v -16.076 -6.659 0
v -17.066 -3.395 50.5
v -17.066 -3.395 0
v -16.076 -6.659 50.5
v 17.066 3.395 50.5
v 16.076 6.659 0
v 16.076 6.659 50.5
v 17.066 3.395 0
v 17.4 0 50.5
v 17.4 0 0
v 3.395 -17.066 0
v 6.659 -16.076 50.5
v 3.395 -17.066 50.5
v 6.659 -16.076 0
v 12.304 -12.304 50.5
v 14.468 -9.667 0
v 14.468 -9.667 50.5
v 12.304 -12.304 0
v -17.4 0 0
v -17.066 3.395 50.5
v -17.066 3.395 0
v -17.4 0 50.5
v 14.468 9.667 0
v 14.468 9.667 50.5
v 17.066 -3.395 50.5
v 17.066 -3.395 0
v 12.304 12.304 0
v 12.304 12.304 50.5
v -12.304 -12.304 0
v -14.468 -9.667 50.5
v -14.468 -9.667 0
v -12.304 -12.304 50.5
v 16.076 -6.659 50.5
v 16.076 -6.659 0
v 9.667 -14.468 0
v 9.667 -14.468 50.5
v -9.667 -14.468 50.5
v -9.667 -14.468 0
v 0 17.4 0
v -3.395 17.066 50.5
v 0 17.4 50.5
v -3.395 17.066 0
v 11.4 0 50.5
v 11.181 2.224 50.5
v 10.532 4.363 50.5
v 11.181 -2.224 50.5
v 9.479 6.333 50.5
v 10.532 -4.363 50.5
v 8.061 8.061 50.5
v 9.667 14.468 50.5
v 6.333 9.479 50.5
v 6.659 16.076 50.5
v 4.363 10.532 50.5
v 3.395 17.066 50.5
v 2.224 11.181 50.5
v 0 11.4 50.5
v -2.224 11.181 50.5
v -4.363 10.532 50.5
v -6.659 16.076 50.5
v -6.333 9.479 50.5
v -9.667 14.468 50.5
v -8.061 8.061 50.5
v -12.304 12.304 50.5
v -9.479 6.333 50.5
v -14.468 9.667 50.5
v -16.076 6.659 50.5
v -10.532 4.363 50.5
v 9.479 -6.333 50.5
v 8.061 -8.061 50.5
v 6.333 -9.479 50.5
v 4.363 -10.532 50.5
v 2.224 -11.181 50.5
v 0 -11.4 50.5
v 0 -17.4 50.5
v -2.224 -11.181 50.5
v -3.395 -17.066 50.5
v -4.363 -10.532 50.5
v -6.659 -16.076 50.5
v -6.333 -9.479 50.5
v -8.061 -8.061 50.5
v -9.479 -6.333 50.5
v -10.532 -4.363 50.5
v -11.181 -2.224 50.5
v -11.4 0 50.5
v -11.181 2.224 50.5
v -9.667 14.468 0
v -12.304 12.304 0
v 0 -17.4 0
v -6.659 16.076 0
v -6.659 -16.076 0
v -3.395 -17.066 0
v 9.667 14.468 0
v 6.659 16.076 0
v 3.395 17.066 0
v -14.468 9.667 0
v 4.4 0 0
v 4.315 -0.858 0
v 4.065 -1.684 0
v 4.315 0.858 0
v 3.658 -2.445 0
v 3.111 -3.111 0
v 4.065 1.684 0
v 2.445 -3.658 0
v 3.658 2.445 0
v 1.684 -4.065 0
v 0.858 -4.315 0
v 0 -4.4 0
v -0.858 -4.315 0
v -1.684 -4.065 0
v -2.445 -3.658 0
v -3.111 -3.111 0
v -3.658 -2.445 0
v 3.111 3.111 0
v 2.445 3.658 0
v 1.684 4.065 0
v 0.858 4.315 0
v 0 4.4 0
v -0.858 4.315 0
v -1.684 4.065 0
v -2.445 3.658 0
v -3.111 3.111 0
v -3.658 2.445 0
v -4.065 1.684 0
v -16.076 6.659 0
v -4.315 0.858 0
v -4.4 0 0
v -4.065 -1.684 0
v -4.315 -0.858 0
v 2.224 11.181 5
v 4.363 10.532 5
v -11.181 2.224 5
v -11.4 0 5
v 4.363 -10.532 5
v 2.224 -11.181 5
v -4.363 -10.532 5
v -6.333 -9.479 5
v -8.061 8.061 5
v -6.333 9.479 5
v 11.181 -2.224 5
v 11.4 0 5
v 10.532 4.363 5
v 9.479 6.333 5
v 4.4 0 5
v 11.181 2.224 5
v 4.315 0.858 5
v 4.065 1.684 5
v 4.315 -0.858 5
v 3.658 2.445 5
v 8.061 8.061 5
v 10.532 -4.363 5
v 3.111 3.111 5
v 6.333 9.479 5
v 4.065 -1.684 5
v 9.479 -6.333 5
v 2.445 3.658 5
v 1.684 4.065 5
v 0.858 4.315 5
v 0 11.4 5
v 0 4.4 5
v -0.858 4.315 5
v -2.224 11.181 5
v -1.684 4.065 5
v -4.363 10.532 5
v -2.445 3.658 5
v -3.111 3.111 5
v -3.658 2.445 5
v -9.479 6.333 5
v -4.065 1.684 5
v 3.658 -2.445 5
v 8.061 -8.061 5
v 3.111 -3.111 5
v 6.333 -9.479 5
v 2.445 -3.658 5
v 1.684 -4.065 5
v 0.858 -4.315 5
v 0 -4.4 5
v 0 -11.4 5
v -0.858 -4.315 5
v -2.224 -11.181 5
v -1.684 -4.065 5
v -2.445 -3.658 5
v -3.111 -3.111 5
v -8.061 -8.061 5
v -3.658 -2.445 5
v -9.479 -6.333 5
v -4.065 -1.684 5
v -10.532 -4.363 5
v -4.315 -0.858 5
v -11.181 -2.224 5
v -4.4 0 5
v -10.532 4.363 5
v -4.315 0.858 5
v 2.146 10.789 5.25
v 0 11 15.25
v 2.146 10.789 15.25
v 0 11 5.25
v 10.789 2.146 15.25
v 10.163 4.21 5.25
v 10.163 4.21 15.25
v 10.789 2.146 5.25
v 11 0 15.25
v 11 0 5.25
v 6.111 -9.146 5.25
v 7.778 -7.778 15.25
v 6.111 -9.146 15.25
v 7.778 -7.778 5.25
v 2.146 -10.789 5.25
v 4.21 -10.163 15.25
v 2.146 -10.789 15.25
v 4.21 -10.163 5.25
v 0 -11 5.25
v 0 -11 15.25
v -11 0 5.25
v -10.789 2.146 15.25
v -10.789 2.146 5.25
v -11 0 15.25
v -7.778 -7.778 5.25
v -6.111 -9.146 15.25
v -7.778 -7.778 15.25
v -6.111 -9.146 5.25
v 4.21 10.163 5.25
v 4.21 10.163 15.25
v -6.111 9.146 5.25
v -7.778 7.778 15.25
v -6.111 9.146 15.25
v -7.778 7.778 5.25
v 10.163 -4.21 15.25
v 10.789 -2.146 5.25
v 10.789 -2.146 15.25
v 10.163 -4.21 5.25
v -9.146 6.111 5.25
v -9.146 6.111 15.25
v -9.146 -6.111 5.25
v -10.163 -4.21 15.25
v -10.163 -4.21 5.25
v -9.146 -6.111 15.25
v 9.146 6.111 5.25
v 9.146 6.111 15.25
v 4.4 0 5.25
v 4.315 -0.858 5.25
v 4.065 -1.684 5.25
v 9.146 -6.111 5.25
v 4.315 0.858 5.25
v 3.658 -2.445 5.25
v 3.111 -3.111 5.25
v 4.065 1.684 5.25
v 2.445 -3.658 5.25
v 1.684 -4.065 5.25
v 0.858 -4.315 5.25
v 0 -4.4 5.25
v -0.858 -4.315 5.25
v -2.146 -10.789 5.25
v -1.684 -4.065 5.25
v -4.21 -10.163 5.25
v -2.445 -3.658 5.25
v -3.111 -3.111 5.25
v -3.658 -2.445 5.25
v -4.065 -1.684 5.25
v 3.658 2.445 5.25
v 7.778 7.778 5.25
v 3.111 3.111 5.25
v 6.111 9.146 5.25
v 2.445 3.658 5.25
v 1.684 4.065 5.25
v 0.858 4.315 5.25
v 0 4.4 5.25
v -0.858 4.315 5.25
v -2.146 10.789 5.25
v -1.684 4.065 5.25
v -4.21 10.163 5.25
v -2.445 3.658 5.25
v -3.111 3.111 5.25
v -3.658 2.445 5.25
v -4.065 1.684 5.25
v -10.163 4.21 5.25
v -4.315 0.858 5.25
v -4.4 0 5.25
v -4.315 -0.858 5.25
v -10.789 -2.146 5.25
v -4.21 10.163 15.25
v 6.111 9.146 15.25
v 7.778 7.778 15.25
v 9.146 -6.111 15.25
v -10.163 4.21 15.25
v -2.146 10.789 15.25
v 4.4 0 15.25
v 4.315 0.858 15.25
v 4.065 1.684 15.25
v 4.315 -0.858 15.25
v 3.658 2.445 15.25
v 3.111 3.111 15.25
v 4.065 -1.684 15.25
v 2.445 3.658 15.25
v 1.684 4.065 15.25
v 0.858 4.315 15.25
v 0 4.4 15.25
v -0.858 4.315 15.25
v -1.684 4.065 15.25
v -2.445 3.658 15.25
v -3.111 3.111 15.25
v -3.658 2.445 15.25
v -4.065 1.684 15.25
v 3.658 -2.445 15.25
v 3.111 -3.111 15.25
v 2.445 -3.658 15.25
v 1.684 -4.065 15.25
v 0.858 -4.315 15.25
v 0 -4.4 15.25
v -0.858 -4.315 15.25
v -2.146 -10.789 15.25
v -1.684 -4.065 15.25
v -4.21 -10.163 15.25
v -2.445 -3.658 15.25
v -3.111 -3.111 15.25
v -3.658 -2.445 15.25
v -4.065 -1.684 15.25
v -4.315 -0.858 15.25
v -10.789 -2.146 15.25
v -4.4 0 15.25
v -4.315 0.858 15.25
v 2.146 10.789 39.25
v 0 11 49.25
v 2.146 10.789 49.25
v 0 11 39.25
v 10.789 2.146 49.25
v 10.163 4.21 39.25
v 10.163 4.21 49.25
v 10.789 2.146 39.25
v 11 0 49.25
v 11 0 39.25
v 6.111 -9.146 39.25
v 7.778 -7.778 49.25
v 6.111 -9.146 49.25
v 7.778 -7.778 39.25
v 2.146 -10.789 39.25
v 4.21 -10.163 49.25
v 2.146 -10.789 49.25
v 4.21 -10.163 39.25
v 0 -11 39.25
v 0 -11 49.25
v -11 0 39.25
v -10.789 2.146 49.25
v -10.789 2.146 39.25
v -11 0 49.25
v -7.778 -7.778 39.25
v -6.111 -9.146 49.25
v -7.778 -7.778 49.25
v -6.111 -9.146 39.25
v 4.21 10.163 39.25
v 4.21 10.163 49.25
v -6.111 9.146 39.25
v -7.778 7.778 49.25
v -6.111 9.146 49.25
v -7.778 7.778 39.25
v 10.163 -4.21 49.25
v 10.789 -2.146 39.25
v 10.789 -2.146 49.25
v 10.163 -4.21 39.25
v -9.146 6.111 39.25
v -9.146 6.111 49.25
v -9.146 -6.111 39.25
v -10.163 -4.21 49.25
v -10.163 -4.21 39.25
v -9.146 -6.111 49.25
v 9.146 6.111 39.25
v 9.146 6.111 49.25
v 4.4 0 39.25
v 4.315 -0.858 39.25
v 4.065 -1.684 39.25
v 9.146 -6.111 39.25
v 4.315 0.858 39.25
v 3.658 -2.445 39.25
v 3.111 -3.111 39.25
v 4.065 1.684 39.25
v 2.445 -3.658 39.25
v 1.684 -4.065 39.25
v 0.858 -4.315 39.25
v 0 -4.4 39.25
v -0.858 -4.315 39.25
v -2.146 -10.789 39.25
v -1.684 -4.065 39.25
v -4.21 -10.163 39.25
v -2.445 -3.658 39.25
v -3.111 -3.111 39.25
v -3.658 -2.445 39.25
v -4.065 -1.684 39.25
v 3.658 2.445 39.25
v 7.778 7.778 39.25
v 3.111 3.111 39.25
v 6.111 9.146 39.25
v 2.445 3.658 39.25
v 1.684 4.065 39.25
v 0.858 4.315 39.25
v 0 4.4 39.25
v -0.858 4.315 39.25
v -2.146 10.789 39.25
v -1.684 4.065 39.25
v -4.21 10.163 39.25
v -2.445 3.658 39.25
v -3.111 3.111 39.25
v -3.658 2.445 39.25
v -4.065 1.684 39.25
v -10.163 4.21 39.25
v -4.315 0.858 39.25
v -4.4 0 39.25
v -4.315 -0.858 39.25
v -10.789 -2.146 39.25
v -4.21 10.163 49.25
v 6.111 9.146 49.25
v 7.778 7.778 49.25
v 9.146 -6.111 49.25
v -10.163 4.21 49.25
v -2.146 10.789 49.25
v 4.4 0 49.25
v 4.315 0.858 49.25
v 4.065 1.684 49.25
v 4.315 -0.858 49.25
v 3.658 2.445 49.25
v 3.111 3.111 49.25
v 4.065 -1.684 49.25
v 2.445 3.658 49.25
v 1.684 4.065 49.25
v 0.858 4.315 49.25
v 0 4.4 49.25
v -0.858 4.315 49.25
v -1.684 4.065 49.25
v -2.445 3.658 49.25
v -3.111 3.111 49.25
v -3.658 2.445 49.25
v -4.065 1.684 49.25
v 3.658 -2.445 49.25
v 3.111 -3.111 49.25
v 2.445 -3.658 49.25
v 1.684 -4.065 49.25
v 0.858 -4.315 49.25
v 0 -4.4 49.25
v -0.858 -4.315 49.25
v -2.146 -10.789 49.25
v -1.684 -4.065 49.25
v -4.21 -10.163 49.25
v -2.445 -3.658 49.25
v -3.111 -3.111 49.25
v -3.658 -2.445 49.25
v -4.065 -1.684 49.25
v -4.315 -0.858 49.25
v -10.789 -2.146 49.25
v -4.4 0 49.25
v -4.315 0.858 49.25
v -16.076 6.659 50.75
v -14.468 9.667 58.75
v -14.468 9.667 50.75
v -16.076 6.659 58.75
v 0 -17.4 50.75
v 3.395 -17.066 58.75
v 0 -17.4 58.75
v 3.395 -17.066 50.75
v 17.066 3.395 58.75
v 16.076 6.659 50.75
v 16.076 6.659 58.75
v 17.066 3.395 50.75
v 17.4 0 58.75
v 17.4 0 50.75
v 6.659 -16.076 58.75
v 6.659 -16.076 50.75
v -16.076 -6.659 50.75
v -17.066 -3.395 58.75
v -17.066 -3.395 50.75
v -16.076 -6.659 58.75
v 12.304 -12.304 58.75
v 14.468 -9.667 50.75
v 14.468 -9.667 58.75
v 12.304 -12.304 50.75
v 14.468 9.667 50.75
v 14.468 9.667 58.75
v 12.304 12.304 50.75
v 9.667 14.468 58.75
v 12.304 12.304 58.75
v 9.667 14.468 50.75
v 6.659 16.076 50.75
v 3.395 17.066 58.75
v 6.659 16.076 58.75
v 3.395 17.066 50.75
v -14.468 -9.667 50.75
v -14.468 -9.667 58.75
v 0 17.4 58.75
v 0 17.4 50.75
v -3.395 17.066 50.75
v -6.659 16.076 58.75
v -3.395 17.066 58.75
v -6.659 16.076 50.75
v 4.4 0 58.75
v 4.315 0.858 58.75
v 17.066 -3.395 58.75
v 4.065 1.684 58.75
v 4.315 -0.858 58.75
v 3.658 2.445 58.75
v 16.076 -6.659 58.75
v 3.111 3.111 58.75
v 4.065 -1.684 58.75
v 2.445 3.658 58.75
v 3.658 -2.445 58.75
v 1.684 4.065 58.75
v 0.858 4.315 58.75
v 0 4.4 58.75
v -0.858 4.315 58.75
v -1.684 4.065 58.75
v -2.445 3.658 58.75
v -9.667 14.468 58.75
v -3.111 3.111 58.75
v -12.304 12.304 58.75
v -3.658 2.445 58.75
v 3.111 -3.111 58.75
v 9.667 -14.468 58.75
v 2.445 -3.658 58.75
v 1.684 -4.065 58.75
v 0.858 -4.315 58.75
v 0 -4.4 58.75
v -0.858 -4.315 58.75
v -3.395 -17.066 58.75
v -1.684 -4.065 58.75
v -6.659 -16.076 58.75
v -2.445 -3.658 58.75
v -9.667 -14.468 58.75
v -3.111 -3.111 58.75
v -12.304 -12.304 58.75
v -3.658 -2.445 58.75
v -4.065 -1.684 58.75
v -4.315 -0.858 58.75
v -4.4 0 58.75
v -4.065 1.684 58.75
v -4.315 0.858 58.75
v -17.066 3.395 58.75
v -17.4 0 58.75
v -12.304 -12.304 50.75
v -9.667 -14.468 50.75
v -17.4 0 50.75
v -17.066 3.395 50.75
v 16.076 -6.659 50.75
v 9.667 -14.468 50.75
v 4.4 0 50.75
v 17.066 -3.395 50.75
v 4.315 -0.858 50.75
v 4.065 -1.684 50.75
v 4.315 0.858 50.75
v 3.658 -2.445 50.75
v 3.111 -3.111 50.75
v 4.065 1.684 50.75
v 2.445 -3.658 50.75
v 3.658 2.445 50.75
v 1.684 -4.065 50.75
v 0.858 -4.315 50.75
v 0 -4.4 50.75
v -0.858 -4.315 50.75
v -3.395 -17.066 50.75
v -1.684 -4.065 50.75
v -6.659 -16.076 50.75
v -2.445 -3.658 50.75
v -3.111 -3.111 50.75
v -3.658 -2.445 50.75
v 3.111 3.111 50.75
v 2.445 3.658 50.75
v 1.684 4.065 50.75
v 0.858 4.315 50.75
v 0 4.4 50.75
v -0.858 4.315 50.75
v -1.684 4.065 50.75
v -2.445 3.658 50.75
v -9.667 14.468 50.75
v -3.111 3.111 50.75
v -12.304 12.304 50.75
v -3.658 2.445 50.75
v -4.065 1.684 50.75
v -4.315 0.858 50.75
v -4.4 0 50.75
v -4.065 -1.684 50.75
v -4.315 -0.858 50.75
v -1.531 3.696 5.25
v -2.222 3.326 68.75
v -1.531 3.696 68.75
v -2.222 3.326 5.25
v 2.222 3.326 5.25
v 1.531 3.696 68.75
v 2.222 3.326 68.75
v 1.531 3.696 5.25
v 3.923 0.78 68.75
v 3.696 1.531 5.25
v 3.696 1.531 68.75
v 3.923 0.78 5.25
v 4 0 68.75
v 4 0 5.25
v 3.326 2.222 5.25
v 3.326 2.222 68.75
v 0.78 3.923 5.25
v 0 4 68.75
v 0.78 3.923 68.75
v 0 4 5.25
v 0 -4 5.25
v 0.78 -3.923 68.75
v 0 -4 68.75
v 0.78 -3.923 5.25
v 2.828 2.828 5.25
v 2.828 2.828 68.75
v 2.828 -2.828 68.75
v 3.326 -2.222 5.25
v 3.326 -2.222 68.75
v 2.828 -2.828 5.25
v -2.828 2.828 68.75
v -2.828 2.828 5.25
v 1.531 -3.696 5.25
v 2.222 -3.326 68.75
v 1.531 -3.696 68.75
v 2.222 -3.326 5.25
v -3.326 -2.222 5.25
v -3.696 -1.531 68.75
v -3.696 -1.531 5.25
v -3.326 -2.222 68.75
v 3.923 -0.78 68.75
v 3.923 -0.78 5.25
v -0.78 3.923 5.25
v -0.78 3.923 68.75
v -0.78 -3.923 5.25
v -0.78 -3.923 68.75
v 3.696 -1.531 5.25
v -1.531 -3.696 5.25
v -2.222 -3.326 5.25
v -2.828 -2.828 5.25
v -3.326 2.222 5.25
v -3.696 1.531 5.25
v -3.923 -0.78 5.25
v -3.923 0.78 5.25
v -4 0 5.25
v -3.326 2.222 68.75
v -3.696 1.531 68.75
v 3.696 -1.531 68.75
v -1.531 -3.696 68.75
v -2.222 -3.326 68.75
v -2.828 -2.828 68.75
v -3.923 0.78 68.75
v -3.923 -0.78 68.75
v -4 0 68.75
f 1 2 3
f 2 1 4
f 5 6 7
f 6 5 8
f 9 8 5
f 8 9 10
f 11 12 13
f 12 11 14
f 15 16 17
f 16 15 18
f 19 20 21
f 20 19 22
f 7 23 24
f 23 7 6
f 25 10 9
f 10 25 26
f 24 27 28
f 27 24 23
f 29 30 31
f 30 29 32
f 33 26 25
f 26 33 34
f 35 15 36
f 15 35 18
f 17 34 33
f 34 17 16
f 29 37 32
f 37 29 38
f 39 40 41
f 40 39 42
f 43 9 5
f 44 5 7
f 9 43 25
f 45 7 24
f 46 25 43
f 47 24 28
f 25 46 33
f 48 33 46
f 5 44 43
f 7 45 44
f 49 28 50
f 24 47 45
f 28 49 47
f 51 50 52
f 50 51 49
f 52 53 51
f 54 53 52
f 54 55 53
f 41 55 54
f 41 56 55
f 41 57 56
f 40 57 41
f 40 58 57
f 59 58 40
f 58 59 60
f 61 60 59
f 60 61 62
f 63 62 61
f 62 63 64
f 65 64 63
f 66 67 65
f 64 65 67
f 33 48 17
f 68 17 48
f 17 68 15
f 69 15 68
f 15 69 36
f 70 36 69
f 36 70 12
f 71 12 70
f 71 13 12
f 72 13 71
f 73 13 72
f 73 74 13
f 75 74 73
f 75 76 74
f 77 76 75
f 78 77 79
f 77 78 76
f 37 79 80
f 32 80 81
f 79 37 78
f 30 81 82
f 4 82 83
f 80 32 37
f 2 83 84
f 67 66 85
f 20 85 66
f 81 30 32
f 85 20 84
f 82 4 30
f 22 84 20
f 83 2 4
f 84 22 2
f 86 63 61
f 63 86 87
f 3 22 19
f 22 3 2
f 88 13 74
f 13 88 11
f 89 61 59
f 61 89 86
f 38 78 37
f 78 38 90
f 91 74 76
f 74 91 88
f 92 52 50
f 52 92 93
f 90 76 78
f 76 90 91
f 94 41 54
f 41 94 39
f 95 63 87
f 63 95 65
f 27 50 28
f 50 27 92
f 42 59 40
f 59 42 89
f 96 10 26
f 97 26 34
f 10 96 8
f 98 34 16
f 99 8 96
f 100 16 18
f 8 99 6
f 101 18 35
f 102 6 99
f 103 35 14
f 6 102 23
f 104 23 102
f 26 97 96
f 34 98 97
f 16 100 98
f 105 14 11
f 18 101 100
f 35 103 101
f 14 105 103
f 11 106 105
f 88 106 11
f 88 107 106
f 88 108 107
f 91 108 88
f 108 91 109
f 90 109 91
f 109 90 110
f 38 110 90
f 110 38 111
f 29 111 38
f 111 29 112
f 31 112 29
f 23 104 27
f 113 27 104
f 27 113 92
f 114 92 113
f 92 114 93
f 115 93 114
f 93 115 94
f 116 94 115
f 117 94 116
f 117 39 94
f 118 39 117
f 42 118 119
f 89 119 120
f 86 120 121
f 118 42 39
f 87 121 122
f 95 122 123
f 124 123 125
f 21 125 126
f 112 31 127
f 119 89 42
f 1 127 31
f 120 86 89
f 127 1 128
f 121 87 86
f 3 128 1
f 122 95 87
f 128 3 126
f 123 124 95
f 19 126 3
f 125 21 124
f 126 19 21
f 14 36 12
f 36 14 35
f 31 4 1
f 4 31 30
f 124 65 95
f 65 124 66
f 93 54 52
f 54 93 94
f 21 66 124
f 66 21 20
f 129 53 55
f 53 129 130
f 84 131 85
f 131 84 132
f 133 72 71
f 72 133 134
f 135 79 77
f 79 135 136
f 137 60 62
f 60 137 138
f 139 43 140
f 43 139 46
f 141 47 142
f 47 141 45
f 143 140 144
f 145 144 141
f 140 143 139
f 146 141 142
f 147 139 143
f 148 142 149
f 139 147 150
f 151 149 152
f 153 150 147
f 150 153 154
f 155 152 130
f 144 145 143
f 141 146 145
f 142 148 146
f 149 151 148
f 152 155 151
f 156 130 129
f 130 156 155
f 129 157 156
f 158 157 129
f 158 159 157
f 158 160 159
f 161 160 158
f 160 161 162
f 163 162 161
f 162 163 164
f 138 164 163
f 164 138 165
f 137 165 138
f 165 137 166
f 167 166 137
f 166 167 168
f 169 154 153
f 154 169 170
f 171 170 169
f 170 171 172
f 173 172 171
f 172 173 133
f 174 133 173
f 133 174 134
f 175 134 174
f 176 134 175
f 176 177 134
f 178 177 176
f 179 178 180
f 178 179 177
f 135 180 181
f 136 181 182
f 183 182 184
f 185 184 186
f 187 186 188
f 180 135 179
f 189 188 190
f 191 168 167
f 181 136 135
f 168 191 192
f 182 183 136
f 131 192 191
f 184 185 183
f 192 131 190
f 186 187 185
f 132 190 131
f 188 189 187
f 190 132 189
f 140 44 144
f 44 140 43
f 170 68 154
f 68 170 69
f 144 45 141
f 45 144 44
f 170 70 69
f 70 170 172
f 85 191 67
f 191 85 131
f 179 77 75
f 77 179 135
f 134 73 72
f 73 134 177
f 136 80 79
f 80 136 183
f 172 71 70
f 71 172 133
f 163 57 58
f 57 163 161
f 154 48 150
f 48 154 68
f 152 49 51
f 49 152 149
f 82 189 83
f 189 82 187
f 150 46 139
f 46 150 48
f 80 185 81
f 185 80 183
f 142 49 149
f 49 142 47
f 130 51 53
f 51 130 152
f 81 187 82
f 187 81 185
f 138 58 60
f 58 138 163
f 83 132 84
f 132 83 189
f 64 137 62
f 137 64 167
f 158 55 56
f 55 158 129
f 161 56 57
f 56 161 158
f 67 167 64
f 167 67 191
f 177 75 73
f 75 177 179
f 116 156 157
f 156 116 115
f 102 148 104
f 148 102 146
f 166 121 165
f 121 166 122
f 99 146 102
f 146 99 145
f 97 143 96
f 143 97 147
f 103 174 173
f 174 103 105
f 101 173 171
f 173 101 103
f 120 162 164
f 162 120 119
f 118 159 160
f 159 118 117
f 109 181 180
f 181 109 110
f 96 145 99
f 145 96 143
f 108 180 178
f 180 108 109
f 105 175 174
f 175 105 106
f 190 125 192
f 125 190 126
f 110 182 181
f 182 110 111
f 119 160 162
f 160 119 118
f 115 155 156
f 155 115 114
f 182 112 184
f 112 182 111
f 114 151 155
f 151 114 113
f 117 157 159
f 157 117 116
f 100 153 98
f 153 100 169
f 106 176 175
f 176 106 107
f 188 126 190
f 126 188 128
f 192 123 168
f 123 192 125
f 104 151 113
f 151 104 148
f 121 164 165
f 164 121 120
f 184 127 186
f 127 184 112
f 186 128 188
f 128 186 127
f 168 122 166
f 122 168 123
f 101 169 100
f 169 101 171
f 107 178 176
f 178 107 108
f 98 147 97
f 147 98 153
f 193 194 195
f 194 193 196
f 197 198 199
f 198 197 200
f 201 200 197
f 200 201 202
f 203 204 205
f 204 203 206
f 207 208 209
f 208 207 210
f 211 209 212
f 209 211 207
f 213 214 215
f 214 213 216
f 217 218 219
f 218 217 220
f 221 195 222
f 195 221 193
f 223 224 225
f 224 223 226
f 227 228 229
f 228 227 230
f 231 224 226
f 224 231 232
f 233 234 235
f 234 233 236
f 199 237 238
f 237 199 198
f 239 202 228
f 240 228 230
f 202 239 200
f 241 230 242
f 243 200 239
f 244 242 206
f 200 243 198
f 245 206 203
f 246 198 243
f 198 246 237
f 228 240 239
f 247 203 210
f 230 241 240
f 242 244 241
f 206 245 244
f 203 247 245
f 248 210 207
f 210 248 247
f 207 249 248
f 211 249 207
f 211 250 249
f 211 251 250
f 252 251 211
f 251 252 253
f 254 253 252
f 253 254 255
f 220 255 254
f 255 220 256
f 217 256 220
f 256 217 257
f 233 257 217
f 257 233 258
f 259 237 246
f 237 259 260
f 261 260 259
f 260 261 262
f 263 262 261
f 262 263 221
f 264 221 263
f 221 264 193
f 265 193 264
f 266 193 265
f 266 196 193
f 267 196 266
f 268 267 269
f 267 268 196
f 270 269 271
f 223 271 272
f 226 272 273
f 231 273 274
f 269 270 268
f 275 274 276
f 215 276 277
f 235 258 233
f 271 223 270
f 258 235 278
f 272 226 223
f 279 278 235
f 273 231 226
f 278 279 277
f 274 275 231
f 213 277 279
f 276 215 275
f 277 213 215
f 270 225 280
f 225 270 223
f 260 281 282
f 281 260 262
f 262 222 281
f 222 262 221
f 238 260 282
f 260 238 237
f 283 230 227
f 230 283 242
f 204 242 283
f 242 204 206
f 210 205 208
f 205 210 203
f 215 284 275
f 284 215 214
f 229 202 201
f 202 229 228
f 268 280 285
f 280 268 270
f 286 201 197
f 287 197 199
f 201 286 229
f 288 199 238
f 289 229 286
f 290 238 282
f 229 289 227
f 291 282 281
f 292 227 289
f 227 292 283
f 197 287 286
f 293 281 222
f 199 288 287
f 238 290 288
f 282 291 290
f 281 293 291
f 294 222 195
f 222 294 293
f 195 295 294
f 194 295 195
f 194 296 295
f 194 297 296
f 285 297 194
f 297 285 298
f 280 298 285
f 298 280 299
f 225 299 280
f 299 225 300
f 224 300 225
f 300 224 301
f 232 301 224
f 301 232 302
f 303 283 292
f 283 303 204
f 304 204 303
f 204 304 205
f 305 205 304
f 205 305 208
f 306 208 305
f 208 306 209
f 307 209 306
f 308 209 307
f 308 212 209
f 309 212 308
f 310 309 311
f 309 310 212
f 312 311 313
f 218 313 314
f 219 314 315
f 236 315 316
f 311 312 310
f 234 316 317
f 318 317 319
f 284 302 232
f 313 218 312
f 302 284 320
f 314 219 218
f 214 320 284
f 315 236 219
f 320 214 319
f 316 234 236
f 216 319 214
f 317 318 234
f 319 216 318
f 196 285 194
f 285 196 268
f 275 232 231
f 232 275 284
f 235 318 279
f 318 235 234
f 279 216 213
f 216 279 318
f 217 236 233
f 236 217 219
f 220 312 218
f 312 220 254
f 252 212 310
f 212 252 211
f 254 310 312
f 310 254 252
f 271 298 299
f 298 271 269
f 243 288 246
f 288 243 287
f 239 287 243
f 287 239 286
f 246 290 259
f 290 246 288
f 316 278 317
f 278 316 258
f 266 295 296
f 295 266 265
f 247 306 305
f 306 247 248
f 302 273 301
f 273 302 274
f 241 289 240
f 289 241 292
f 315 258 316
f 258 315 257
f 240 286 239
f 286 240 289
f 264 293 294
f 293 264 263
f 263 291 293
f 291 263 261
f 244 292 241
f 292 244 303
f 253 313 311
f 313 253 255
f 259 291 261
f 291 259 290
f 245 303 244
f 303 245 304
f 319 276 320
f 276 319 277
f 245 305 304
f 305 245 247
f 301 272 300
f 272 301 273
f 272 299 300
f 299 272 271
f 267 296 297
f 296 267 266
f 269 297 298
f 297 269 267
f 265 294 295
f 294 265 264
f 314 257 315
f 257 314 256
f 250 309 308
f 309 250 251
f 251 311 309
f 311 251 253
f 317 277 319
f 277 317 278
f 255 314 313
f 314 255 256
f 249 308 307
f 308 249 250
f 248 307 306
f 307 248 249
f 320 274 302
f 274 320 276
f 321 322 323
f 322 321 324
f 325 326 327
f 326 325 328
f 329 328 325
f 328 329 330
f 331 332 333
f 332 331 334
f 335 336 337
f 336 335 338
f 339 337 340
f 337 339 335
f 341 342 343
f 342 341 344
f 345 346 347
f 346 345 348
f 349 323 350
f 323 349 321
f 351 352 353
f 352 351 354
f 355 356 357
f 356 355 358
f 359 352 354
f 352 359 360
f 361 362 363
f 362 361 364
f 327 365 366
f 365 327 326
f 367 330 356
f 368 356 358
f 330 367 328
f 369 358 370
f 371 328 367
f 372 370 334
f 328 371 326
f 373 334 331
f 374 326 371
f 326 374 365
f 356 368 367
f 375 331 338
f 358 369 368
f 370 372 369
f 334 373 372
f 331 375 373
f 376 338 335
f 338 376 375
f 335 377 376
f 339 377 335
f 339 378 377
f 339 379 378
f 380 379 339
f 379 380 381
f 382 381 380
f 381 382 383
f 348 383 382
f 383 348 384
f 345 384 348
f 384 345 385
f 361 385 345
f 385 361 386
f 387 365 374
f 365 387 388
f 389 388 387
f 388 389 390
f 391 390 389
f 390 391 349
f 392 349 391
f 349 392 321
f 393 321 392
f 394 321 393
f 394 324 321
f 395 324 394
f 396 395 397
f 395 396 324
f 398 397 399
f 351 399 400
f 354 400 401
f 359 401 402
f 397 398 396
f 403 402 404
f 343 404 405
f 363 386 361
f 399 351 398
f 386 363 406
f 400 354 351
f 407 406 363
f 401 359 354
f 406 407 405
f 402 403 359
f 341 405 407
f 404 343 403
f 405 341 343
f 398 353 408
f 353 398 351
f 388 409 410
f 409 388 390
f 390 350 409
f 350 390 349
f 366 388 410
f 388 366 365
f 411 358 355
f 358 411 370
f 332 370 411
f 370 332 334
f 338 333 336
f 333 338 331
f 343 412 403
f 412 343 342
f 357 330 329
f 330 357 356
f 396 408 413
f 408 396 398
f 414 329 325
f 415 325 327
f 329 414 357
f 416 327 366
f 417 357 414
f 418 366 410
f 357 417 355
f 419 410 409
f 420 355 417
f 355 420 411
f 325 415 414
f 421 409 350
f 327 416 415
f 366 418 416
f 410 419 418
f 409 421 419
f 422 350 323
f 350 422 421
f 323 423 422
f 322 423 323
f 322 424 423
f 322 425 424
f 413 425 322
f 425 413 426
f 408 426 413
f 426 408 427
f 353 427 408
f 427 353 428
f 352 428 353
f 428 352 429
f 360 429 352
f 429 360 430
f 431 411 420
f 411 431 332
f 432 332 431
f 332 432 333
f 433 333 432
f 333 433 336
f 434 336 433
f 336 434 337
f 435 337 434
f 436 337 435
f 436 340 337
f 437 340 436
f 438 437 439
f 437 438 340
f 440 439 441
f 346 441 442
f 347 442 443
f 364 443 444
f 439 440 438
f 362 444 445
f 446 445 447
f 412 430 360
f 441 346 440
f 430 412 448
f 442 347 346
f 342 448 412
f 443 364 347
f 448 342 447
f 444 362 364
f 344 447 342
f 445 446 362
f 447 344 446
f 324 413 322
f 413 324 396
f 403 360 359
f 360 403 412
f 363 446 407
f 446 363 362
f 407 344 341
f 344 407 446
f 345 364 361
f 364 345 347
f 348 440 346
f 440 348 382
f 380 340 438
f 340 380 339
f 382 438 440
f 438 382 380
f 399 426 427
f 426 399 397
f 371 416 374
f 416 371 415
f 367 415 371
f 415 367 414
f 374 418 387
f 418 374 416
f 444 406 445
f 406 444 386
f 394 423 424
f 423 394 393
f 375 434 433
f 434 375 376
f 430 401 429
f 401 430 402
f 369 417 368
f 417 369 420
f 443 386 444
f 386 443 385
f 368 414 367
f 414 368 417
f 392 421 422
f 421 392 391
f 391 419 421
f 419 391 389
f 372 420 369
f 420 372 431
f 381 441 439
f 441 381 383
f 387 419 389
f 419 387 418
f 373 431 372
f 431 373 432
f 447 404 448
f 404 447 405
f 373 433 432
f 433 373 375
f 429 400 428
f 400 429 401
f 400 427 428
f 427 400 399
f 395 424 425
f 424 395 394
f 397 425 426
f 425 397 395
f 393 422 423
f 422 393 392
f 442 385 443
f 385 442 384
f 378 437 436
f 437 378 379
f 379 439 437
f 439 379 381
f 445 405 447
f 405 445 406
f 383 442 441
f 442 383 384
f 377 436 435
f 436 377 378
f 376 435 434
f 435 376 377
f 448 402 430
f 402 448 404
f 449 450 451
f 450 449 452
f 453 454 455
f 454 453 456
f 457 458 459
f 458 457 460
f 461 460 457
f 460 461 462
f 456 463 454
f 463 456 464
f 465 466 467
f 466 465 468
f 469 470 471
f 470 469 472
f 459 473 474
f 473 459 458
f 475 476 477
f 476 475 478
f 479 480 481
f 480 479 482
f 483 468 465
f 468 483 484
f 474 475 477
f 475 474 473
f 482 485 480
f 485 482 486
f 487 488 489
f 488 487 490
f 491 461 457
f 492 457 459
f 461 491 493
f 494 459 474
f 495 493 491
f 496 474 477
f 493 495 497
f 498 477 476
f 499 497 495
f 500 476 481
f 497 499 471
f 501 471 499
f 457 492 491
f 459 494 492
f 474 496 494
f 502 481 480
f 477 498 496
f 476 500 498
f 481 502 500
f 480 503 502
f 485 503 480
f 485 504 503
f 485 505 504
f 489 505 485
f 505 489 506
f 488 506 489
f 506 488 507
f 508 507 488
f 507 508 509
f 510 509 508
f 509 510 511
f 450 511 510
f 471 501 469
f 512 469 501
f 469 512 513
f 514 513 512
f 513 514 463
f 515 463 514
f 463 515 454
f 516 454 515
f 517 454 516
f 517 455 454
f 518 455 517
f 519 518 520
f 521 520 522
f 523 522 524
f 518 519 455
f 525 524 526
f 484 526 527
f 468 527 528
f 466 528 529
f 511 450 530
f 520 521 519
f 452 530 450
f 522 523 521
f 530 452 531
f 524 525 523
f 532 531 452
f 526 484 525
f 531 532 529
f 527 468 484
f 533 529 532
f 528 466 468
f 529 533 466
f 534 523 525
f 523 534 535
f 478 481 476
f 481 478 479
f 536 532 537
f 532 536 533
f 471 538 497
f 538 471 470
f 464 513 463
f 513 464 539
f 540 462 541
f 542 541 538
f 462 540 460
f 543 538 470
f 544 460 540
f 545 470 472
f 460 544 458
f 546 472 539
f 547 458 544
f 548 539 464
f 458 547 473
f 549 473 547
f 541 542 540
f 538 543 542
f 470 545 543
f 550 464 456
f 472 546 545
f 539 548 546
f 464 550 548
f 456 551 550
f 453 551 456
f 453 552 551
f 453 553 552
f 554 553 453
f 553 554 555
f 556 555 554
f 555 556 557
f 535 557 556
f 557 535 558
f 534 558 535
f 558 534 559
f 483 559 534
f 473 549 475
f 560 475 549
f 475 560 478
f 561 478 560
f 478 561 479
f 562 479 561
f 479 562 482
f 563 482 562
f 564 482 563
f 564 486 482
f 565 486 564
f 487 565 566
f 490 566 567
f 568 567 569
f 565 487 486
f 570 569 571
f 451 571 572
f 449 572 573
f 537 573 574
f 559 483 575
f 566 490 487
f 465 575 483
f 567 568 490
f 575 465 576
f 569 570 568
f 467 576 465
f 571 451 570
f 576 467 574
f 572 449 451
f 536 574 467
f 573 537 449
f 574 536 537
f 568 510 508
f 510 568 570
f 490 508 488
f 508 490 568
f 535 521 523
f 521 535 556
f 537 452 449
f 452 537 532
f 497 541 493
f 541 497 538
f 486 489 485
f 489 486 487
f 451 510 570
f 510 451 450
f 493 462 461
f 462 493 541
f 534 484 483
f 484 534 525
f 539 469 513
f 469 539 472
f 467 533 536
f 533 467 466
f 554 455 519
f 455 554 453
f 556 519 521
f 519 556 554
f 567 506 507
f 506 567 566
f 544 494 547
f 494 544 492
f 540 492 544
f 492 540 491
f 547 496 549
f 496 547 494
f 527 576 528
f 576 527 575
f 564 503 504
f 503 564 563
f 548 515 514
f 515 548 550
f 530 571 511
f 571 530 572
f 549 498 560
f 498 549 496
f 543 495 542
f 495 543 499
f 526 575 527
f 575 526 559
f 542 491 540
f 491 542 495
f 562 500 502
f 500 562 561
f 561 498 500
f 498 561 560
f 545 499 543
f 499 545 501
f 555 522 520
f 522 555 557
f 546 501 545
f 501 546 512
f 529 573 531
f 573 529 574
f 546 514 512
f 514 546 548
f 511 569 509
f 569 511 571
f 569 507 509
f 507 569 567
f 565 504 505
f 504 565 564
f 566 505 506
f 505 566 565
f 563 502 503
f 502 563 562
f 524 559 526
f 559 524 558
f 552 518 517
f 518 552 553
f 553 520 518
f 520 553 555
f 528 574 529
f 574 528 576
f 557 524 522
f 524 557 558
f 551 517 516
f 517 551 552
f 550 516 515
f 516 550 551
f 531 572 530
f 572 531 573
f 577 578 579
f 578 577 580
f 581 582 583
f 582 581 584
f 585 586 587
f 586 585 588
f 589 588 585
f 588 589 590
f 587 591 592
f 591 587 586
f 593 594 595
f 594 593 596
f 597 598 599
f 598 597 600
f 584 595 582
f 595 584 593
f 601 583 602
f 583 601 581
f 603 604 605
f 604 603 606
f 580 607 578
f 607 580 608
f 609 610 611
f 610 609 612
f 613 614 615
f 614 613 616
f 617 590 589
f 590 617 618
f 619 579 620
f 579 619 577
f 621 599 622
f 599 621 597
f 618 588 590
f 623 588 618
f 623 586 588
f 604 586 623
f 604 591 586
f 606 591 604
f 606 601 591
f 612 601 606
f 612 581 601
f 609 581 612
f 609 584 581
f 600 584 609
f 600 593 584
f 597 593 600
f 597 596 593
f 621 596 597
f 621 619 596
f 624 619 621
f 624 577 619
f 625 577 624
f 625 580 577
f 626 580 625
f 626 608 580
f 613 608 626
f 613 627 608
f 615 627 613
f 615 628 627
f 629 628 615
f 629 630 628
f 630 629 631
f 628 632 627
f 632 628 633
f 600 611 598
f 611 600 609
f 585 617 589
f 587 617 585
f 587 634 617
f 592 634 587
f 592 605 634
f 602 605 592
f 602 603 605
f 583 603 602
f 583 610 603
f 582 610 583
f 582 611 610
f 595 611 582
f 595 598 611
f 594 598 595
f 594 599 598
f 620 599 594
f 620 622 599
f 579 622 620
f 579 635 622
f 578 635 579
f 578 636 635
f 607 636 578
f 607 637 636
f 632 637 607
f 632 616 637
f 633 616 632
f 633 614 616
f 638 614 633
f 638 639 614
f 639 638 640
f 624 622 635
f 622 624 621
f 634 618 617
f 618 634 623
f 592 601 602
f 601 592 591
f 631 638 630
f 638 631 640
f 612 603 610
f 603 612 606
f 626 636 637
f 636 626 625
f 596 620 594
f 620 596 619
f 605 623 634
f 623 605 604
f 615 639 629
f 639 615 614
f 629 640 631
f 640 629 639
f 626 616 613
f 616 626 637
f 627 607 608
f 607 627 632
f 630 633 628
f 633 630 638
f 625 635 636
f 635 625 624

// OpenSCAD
$fn = 32;

// ------------------------------------------------------------------------
// Shaft station: cup d34.8 x 50.5 mm, shaft d8
// Every part is its own module, assembly() places every instance.
// ------------------------------------------------------------------------

// --- part 1 ---
module housing_cup() {
  difference() {
    cylinder(h = 50.5, d = 34.8);
    translate([0, 0, 5]) cylinder(h = 46.5, d = 22.8);
    translate([0, 0, -1]) cylinder(h = 7, d = 8.8);
  }
}

// --- part 2 ---
module bearing_lower() {
  difference() {
      translate([0, 0, 0]) cylinder(h = 10, d = 22);
      translate([0, 0, -1]) cylinder(h = 12, d = 8.8);
    }
}

// --- part 3 ---
module bearing_upper() {
  difference() {
      translate([0, 0, 0]) cylinder(h = 10, d = 22);
      translate([0, 0, -1]) cylinder(h = 12, d = 8.8);
    }
}

// --- part 4 ---
module station_shaft() {
  translate([0, 0, -31.75]) cylinder(h = 63.5, d = 8);
}

// --- part 5 ---
module station_cover() {
  difference() {
    cylinder(h = 8, d = 34.8);
    translate([0, 0, -1]) cylinder(h = 10, d = 8.8);
  }
}

// --- assembly ---
module assembly() {
  color([0.80, 0.24, 0.20]) translate([0, 0, 0]) rotate([0, 0, 0]) housing_cup();
  color([0.20, 0.45, 0.75]) translate([0, 0, 5.25]) rotate([0, 0, 0]) bearing_lower();
  color([0.25, 0.62, 0.32]) translate([0, 0, 39.25]) rotate([0, 0, 0]) bearing_upper();
  color([0.92, 0.70, 0.18]) translate([0, 0, 37]) rotate([0, 0, 0]) station_shaft();
  color([0.58, 0.35, 0.70]) translate([0, 0, 50.75]) rotate([0, 0, 0]) station_cover();
}

assembly();
